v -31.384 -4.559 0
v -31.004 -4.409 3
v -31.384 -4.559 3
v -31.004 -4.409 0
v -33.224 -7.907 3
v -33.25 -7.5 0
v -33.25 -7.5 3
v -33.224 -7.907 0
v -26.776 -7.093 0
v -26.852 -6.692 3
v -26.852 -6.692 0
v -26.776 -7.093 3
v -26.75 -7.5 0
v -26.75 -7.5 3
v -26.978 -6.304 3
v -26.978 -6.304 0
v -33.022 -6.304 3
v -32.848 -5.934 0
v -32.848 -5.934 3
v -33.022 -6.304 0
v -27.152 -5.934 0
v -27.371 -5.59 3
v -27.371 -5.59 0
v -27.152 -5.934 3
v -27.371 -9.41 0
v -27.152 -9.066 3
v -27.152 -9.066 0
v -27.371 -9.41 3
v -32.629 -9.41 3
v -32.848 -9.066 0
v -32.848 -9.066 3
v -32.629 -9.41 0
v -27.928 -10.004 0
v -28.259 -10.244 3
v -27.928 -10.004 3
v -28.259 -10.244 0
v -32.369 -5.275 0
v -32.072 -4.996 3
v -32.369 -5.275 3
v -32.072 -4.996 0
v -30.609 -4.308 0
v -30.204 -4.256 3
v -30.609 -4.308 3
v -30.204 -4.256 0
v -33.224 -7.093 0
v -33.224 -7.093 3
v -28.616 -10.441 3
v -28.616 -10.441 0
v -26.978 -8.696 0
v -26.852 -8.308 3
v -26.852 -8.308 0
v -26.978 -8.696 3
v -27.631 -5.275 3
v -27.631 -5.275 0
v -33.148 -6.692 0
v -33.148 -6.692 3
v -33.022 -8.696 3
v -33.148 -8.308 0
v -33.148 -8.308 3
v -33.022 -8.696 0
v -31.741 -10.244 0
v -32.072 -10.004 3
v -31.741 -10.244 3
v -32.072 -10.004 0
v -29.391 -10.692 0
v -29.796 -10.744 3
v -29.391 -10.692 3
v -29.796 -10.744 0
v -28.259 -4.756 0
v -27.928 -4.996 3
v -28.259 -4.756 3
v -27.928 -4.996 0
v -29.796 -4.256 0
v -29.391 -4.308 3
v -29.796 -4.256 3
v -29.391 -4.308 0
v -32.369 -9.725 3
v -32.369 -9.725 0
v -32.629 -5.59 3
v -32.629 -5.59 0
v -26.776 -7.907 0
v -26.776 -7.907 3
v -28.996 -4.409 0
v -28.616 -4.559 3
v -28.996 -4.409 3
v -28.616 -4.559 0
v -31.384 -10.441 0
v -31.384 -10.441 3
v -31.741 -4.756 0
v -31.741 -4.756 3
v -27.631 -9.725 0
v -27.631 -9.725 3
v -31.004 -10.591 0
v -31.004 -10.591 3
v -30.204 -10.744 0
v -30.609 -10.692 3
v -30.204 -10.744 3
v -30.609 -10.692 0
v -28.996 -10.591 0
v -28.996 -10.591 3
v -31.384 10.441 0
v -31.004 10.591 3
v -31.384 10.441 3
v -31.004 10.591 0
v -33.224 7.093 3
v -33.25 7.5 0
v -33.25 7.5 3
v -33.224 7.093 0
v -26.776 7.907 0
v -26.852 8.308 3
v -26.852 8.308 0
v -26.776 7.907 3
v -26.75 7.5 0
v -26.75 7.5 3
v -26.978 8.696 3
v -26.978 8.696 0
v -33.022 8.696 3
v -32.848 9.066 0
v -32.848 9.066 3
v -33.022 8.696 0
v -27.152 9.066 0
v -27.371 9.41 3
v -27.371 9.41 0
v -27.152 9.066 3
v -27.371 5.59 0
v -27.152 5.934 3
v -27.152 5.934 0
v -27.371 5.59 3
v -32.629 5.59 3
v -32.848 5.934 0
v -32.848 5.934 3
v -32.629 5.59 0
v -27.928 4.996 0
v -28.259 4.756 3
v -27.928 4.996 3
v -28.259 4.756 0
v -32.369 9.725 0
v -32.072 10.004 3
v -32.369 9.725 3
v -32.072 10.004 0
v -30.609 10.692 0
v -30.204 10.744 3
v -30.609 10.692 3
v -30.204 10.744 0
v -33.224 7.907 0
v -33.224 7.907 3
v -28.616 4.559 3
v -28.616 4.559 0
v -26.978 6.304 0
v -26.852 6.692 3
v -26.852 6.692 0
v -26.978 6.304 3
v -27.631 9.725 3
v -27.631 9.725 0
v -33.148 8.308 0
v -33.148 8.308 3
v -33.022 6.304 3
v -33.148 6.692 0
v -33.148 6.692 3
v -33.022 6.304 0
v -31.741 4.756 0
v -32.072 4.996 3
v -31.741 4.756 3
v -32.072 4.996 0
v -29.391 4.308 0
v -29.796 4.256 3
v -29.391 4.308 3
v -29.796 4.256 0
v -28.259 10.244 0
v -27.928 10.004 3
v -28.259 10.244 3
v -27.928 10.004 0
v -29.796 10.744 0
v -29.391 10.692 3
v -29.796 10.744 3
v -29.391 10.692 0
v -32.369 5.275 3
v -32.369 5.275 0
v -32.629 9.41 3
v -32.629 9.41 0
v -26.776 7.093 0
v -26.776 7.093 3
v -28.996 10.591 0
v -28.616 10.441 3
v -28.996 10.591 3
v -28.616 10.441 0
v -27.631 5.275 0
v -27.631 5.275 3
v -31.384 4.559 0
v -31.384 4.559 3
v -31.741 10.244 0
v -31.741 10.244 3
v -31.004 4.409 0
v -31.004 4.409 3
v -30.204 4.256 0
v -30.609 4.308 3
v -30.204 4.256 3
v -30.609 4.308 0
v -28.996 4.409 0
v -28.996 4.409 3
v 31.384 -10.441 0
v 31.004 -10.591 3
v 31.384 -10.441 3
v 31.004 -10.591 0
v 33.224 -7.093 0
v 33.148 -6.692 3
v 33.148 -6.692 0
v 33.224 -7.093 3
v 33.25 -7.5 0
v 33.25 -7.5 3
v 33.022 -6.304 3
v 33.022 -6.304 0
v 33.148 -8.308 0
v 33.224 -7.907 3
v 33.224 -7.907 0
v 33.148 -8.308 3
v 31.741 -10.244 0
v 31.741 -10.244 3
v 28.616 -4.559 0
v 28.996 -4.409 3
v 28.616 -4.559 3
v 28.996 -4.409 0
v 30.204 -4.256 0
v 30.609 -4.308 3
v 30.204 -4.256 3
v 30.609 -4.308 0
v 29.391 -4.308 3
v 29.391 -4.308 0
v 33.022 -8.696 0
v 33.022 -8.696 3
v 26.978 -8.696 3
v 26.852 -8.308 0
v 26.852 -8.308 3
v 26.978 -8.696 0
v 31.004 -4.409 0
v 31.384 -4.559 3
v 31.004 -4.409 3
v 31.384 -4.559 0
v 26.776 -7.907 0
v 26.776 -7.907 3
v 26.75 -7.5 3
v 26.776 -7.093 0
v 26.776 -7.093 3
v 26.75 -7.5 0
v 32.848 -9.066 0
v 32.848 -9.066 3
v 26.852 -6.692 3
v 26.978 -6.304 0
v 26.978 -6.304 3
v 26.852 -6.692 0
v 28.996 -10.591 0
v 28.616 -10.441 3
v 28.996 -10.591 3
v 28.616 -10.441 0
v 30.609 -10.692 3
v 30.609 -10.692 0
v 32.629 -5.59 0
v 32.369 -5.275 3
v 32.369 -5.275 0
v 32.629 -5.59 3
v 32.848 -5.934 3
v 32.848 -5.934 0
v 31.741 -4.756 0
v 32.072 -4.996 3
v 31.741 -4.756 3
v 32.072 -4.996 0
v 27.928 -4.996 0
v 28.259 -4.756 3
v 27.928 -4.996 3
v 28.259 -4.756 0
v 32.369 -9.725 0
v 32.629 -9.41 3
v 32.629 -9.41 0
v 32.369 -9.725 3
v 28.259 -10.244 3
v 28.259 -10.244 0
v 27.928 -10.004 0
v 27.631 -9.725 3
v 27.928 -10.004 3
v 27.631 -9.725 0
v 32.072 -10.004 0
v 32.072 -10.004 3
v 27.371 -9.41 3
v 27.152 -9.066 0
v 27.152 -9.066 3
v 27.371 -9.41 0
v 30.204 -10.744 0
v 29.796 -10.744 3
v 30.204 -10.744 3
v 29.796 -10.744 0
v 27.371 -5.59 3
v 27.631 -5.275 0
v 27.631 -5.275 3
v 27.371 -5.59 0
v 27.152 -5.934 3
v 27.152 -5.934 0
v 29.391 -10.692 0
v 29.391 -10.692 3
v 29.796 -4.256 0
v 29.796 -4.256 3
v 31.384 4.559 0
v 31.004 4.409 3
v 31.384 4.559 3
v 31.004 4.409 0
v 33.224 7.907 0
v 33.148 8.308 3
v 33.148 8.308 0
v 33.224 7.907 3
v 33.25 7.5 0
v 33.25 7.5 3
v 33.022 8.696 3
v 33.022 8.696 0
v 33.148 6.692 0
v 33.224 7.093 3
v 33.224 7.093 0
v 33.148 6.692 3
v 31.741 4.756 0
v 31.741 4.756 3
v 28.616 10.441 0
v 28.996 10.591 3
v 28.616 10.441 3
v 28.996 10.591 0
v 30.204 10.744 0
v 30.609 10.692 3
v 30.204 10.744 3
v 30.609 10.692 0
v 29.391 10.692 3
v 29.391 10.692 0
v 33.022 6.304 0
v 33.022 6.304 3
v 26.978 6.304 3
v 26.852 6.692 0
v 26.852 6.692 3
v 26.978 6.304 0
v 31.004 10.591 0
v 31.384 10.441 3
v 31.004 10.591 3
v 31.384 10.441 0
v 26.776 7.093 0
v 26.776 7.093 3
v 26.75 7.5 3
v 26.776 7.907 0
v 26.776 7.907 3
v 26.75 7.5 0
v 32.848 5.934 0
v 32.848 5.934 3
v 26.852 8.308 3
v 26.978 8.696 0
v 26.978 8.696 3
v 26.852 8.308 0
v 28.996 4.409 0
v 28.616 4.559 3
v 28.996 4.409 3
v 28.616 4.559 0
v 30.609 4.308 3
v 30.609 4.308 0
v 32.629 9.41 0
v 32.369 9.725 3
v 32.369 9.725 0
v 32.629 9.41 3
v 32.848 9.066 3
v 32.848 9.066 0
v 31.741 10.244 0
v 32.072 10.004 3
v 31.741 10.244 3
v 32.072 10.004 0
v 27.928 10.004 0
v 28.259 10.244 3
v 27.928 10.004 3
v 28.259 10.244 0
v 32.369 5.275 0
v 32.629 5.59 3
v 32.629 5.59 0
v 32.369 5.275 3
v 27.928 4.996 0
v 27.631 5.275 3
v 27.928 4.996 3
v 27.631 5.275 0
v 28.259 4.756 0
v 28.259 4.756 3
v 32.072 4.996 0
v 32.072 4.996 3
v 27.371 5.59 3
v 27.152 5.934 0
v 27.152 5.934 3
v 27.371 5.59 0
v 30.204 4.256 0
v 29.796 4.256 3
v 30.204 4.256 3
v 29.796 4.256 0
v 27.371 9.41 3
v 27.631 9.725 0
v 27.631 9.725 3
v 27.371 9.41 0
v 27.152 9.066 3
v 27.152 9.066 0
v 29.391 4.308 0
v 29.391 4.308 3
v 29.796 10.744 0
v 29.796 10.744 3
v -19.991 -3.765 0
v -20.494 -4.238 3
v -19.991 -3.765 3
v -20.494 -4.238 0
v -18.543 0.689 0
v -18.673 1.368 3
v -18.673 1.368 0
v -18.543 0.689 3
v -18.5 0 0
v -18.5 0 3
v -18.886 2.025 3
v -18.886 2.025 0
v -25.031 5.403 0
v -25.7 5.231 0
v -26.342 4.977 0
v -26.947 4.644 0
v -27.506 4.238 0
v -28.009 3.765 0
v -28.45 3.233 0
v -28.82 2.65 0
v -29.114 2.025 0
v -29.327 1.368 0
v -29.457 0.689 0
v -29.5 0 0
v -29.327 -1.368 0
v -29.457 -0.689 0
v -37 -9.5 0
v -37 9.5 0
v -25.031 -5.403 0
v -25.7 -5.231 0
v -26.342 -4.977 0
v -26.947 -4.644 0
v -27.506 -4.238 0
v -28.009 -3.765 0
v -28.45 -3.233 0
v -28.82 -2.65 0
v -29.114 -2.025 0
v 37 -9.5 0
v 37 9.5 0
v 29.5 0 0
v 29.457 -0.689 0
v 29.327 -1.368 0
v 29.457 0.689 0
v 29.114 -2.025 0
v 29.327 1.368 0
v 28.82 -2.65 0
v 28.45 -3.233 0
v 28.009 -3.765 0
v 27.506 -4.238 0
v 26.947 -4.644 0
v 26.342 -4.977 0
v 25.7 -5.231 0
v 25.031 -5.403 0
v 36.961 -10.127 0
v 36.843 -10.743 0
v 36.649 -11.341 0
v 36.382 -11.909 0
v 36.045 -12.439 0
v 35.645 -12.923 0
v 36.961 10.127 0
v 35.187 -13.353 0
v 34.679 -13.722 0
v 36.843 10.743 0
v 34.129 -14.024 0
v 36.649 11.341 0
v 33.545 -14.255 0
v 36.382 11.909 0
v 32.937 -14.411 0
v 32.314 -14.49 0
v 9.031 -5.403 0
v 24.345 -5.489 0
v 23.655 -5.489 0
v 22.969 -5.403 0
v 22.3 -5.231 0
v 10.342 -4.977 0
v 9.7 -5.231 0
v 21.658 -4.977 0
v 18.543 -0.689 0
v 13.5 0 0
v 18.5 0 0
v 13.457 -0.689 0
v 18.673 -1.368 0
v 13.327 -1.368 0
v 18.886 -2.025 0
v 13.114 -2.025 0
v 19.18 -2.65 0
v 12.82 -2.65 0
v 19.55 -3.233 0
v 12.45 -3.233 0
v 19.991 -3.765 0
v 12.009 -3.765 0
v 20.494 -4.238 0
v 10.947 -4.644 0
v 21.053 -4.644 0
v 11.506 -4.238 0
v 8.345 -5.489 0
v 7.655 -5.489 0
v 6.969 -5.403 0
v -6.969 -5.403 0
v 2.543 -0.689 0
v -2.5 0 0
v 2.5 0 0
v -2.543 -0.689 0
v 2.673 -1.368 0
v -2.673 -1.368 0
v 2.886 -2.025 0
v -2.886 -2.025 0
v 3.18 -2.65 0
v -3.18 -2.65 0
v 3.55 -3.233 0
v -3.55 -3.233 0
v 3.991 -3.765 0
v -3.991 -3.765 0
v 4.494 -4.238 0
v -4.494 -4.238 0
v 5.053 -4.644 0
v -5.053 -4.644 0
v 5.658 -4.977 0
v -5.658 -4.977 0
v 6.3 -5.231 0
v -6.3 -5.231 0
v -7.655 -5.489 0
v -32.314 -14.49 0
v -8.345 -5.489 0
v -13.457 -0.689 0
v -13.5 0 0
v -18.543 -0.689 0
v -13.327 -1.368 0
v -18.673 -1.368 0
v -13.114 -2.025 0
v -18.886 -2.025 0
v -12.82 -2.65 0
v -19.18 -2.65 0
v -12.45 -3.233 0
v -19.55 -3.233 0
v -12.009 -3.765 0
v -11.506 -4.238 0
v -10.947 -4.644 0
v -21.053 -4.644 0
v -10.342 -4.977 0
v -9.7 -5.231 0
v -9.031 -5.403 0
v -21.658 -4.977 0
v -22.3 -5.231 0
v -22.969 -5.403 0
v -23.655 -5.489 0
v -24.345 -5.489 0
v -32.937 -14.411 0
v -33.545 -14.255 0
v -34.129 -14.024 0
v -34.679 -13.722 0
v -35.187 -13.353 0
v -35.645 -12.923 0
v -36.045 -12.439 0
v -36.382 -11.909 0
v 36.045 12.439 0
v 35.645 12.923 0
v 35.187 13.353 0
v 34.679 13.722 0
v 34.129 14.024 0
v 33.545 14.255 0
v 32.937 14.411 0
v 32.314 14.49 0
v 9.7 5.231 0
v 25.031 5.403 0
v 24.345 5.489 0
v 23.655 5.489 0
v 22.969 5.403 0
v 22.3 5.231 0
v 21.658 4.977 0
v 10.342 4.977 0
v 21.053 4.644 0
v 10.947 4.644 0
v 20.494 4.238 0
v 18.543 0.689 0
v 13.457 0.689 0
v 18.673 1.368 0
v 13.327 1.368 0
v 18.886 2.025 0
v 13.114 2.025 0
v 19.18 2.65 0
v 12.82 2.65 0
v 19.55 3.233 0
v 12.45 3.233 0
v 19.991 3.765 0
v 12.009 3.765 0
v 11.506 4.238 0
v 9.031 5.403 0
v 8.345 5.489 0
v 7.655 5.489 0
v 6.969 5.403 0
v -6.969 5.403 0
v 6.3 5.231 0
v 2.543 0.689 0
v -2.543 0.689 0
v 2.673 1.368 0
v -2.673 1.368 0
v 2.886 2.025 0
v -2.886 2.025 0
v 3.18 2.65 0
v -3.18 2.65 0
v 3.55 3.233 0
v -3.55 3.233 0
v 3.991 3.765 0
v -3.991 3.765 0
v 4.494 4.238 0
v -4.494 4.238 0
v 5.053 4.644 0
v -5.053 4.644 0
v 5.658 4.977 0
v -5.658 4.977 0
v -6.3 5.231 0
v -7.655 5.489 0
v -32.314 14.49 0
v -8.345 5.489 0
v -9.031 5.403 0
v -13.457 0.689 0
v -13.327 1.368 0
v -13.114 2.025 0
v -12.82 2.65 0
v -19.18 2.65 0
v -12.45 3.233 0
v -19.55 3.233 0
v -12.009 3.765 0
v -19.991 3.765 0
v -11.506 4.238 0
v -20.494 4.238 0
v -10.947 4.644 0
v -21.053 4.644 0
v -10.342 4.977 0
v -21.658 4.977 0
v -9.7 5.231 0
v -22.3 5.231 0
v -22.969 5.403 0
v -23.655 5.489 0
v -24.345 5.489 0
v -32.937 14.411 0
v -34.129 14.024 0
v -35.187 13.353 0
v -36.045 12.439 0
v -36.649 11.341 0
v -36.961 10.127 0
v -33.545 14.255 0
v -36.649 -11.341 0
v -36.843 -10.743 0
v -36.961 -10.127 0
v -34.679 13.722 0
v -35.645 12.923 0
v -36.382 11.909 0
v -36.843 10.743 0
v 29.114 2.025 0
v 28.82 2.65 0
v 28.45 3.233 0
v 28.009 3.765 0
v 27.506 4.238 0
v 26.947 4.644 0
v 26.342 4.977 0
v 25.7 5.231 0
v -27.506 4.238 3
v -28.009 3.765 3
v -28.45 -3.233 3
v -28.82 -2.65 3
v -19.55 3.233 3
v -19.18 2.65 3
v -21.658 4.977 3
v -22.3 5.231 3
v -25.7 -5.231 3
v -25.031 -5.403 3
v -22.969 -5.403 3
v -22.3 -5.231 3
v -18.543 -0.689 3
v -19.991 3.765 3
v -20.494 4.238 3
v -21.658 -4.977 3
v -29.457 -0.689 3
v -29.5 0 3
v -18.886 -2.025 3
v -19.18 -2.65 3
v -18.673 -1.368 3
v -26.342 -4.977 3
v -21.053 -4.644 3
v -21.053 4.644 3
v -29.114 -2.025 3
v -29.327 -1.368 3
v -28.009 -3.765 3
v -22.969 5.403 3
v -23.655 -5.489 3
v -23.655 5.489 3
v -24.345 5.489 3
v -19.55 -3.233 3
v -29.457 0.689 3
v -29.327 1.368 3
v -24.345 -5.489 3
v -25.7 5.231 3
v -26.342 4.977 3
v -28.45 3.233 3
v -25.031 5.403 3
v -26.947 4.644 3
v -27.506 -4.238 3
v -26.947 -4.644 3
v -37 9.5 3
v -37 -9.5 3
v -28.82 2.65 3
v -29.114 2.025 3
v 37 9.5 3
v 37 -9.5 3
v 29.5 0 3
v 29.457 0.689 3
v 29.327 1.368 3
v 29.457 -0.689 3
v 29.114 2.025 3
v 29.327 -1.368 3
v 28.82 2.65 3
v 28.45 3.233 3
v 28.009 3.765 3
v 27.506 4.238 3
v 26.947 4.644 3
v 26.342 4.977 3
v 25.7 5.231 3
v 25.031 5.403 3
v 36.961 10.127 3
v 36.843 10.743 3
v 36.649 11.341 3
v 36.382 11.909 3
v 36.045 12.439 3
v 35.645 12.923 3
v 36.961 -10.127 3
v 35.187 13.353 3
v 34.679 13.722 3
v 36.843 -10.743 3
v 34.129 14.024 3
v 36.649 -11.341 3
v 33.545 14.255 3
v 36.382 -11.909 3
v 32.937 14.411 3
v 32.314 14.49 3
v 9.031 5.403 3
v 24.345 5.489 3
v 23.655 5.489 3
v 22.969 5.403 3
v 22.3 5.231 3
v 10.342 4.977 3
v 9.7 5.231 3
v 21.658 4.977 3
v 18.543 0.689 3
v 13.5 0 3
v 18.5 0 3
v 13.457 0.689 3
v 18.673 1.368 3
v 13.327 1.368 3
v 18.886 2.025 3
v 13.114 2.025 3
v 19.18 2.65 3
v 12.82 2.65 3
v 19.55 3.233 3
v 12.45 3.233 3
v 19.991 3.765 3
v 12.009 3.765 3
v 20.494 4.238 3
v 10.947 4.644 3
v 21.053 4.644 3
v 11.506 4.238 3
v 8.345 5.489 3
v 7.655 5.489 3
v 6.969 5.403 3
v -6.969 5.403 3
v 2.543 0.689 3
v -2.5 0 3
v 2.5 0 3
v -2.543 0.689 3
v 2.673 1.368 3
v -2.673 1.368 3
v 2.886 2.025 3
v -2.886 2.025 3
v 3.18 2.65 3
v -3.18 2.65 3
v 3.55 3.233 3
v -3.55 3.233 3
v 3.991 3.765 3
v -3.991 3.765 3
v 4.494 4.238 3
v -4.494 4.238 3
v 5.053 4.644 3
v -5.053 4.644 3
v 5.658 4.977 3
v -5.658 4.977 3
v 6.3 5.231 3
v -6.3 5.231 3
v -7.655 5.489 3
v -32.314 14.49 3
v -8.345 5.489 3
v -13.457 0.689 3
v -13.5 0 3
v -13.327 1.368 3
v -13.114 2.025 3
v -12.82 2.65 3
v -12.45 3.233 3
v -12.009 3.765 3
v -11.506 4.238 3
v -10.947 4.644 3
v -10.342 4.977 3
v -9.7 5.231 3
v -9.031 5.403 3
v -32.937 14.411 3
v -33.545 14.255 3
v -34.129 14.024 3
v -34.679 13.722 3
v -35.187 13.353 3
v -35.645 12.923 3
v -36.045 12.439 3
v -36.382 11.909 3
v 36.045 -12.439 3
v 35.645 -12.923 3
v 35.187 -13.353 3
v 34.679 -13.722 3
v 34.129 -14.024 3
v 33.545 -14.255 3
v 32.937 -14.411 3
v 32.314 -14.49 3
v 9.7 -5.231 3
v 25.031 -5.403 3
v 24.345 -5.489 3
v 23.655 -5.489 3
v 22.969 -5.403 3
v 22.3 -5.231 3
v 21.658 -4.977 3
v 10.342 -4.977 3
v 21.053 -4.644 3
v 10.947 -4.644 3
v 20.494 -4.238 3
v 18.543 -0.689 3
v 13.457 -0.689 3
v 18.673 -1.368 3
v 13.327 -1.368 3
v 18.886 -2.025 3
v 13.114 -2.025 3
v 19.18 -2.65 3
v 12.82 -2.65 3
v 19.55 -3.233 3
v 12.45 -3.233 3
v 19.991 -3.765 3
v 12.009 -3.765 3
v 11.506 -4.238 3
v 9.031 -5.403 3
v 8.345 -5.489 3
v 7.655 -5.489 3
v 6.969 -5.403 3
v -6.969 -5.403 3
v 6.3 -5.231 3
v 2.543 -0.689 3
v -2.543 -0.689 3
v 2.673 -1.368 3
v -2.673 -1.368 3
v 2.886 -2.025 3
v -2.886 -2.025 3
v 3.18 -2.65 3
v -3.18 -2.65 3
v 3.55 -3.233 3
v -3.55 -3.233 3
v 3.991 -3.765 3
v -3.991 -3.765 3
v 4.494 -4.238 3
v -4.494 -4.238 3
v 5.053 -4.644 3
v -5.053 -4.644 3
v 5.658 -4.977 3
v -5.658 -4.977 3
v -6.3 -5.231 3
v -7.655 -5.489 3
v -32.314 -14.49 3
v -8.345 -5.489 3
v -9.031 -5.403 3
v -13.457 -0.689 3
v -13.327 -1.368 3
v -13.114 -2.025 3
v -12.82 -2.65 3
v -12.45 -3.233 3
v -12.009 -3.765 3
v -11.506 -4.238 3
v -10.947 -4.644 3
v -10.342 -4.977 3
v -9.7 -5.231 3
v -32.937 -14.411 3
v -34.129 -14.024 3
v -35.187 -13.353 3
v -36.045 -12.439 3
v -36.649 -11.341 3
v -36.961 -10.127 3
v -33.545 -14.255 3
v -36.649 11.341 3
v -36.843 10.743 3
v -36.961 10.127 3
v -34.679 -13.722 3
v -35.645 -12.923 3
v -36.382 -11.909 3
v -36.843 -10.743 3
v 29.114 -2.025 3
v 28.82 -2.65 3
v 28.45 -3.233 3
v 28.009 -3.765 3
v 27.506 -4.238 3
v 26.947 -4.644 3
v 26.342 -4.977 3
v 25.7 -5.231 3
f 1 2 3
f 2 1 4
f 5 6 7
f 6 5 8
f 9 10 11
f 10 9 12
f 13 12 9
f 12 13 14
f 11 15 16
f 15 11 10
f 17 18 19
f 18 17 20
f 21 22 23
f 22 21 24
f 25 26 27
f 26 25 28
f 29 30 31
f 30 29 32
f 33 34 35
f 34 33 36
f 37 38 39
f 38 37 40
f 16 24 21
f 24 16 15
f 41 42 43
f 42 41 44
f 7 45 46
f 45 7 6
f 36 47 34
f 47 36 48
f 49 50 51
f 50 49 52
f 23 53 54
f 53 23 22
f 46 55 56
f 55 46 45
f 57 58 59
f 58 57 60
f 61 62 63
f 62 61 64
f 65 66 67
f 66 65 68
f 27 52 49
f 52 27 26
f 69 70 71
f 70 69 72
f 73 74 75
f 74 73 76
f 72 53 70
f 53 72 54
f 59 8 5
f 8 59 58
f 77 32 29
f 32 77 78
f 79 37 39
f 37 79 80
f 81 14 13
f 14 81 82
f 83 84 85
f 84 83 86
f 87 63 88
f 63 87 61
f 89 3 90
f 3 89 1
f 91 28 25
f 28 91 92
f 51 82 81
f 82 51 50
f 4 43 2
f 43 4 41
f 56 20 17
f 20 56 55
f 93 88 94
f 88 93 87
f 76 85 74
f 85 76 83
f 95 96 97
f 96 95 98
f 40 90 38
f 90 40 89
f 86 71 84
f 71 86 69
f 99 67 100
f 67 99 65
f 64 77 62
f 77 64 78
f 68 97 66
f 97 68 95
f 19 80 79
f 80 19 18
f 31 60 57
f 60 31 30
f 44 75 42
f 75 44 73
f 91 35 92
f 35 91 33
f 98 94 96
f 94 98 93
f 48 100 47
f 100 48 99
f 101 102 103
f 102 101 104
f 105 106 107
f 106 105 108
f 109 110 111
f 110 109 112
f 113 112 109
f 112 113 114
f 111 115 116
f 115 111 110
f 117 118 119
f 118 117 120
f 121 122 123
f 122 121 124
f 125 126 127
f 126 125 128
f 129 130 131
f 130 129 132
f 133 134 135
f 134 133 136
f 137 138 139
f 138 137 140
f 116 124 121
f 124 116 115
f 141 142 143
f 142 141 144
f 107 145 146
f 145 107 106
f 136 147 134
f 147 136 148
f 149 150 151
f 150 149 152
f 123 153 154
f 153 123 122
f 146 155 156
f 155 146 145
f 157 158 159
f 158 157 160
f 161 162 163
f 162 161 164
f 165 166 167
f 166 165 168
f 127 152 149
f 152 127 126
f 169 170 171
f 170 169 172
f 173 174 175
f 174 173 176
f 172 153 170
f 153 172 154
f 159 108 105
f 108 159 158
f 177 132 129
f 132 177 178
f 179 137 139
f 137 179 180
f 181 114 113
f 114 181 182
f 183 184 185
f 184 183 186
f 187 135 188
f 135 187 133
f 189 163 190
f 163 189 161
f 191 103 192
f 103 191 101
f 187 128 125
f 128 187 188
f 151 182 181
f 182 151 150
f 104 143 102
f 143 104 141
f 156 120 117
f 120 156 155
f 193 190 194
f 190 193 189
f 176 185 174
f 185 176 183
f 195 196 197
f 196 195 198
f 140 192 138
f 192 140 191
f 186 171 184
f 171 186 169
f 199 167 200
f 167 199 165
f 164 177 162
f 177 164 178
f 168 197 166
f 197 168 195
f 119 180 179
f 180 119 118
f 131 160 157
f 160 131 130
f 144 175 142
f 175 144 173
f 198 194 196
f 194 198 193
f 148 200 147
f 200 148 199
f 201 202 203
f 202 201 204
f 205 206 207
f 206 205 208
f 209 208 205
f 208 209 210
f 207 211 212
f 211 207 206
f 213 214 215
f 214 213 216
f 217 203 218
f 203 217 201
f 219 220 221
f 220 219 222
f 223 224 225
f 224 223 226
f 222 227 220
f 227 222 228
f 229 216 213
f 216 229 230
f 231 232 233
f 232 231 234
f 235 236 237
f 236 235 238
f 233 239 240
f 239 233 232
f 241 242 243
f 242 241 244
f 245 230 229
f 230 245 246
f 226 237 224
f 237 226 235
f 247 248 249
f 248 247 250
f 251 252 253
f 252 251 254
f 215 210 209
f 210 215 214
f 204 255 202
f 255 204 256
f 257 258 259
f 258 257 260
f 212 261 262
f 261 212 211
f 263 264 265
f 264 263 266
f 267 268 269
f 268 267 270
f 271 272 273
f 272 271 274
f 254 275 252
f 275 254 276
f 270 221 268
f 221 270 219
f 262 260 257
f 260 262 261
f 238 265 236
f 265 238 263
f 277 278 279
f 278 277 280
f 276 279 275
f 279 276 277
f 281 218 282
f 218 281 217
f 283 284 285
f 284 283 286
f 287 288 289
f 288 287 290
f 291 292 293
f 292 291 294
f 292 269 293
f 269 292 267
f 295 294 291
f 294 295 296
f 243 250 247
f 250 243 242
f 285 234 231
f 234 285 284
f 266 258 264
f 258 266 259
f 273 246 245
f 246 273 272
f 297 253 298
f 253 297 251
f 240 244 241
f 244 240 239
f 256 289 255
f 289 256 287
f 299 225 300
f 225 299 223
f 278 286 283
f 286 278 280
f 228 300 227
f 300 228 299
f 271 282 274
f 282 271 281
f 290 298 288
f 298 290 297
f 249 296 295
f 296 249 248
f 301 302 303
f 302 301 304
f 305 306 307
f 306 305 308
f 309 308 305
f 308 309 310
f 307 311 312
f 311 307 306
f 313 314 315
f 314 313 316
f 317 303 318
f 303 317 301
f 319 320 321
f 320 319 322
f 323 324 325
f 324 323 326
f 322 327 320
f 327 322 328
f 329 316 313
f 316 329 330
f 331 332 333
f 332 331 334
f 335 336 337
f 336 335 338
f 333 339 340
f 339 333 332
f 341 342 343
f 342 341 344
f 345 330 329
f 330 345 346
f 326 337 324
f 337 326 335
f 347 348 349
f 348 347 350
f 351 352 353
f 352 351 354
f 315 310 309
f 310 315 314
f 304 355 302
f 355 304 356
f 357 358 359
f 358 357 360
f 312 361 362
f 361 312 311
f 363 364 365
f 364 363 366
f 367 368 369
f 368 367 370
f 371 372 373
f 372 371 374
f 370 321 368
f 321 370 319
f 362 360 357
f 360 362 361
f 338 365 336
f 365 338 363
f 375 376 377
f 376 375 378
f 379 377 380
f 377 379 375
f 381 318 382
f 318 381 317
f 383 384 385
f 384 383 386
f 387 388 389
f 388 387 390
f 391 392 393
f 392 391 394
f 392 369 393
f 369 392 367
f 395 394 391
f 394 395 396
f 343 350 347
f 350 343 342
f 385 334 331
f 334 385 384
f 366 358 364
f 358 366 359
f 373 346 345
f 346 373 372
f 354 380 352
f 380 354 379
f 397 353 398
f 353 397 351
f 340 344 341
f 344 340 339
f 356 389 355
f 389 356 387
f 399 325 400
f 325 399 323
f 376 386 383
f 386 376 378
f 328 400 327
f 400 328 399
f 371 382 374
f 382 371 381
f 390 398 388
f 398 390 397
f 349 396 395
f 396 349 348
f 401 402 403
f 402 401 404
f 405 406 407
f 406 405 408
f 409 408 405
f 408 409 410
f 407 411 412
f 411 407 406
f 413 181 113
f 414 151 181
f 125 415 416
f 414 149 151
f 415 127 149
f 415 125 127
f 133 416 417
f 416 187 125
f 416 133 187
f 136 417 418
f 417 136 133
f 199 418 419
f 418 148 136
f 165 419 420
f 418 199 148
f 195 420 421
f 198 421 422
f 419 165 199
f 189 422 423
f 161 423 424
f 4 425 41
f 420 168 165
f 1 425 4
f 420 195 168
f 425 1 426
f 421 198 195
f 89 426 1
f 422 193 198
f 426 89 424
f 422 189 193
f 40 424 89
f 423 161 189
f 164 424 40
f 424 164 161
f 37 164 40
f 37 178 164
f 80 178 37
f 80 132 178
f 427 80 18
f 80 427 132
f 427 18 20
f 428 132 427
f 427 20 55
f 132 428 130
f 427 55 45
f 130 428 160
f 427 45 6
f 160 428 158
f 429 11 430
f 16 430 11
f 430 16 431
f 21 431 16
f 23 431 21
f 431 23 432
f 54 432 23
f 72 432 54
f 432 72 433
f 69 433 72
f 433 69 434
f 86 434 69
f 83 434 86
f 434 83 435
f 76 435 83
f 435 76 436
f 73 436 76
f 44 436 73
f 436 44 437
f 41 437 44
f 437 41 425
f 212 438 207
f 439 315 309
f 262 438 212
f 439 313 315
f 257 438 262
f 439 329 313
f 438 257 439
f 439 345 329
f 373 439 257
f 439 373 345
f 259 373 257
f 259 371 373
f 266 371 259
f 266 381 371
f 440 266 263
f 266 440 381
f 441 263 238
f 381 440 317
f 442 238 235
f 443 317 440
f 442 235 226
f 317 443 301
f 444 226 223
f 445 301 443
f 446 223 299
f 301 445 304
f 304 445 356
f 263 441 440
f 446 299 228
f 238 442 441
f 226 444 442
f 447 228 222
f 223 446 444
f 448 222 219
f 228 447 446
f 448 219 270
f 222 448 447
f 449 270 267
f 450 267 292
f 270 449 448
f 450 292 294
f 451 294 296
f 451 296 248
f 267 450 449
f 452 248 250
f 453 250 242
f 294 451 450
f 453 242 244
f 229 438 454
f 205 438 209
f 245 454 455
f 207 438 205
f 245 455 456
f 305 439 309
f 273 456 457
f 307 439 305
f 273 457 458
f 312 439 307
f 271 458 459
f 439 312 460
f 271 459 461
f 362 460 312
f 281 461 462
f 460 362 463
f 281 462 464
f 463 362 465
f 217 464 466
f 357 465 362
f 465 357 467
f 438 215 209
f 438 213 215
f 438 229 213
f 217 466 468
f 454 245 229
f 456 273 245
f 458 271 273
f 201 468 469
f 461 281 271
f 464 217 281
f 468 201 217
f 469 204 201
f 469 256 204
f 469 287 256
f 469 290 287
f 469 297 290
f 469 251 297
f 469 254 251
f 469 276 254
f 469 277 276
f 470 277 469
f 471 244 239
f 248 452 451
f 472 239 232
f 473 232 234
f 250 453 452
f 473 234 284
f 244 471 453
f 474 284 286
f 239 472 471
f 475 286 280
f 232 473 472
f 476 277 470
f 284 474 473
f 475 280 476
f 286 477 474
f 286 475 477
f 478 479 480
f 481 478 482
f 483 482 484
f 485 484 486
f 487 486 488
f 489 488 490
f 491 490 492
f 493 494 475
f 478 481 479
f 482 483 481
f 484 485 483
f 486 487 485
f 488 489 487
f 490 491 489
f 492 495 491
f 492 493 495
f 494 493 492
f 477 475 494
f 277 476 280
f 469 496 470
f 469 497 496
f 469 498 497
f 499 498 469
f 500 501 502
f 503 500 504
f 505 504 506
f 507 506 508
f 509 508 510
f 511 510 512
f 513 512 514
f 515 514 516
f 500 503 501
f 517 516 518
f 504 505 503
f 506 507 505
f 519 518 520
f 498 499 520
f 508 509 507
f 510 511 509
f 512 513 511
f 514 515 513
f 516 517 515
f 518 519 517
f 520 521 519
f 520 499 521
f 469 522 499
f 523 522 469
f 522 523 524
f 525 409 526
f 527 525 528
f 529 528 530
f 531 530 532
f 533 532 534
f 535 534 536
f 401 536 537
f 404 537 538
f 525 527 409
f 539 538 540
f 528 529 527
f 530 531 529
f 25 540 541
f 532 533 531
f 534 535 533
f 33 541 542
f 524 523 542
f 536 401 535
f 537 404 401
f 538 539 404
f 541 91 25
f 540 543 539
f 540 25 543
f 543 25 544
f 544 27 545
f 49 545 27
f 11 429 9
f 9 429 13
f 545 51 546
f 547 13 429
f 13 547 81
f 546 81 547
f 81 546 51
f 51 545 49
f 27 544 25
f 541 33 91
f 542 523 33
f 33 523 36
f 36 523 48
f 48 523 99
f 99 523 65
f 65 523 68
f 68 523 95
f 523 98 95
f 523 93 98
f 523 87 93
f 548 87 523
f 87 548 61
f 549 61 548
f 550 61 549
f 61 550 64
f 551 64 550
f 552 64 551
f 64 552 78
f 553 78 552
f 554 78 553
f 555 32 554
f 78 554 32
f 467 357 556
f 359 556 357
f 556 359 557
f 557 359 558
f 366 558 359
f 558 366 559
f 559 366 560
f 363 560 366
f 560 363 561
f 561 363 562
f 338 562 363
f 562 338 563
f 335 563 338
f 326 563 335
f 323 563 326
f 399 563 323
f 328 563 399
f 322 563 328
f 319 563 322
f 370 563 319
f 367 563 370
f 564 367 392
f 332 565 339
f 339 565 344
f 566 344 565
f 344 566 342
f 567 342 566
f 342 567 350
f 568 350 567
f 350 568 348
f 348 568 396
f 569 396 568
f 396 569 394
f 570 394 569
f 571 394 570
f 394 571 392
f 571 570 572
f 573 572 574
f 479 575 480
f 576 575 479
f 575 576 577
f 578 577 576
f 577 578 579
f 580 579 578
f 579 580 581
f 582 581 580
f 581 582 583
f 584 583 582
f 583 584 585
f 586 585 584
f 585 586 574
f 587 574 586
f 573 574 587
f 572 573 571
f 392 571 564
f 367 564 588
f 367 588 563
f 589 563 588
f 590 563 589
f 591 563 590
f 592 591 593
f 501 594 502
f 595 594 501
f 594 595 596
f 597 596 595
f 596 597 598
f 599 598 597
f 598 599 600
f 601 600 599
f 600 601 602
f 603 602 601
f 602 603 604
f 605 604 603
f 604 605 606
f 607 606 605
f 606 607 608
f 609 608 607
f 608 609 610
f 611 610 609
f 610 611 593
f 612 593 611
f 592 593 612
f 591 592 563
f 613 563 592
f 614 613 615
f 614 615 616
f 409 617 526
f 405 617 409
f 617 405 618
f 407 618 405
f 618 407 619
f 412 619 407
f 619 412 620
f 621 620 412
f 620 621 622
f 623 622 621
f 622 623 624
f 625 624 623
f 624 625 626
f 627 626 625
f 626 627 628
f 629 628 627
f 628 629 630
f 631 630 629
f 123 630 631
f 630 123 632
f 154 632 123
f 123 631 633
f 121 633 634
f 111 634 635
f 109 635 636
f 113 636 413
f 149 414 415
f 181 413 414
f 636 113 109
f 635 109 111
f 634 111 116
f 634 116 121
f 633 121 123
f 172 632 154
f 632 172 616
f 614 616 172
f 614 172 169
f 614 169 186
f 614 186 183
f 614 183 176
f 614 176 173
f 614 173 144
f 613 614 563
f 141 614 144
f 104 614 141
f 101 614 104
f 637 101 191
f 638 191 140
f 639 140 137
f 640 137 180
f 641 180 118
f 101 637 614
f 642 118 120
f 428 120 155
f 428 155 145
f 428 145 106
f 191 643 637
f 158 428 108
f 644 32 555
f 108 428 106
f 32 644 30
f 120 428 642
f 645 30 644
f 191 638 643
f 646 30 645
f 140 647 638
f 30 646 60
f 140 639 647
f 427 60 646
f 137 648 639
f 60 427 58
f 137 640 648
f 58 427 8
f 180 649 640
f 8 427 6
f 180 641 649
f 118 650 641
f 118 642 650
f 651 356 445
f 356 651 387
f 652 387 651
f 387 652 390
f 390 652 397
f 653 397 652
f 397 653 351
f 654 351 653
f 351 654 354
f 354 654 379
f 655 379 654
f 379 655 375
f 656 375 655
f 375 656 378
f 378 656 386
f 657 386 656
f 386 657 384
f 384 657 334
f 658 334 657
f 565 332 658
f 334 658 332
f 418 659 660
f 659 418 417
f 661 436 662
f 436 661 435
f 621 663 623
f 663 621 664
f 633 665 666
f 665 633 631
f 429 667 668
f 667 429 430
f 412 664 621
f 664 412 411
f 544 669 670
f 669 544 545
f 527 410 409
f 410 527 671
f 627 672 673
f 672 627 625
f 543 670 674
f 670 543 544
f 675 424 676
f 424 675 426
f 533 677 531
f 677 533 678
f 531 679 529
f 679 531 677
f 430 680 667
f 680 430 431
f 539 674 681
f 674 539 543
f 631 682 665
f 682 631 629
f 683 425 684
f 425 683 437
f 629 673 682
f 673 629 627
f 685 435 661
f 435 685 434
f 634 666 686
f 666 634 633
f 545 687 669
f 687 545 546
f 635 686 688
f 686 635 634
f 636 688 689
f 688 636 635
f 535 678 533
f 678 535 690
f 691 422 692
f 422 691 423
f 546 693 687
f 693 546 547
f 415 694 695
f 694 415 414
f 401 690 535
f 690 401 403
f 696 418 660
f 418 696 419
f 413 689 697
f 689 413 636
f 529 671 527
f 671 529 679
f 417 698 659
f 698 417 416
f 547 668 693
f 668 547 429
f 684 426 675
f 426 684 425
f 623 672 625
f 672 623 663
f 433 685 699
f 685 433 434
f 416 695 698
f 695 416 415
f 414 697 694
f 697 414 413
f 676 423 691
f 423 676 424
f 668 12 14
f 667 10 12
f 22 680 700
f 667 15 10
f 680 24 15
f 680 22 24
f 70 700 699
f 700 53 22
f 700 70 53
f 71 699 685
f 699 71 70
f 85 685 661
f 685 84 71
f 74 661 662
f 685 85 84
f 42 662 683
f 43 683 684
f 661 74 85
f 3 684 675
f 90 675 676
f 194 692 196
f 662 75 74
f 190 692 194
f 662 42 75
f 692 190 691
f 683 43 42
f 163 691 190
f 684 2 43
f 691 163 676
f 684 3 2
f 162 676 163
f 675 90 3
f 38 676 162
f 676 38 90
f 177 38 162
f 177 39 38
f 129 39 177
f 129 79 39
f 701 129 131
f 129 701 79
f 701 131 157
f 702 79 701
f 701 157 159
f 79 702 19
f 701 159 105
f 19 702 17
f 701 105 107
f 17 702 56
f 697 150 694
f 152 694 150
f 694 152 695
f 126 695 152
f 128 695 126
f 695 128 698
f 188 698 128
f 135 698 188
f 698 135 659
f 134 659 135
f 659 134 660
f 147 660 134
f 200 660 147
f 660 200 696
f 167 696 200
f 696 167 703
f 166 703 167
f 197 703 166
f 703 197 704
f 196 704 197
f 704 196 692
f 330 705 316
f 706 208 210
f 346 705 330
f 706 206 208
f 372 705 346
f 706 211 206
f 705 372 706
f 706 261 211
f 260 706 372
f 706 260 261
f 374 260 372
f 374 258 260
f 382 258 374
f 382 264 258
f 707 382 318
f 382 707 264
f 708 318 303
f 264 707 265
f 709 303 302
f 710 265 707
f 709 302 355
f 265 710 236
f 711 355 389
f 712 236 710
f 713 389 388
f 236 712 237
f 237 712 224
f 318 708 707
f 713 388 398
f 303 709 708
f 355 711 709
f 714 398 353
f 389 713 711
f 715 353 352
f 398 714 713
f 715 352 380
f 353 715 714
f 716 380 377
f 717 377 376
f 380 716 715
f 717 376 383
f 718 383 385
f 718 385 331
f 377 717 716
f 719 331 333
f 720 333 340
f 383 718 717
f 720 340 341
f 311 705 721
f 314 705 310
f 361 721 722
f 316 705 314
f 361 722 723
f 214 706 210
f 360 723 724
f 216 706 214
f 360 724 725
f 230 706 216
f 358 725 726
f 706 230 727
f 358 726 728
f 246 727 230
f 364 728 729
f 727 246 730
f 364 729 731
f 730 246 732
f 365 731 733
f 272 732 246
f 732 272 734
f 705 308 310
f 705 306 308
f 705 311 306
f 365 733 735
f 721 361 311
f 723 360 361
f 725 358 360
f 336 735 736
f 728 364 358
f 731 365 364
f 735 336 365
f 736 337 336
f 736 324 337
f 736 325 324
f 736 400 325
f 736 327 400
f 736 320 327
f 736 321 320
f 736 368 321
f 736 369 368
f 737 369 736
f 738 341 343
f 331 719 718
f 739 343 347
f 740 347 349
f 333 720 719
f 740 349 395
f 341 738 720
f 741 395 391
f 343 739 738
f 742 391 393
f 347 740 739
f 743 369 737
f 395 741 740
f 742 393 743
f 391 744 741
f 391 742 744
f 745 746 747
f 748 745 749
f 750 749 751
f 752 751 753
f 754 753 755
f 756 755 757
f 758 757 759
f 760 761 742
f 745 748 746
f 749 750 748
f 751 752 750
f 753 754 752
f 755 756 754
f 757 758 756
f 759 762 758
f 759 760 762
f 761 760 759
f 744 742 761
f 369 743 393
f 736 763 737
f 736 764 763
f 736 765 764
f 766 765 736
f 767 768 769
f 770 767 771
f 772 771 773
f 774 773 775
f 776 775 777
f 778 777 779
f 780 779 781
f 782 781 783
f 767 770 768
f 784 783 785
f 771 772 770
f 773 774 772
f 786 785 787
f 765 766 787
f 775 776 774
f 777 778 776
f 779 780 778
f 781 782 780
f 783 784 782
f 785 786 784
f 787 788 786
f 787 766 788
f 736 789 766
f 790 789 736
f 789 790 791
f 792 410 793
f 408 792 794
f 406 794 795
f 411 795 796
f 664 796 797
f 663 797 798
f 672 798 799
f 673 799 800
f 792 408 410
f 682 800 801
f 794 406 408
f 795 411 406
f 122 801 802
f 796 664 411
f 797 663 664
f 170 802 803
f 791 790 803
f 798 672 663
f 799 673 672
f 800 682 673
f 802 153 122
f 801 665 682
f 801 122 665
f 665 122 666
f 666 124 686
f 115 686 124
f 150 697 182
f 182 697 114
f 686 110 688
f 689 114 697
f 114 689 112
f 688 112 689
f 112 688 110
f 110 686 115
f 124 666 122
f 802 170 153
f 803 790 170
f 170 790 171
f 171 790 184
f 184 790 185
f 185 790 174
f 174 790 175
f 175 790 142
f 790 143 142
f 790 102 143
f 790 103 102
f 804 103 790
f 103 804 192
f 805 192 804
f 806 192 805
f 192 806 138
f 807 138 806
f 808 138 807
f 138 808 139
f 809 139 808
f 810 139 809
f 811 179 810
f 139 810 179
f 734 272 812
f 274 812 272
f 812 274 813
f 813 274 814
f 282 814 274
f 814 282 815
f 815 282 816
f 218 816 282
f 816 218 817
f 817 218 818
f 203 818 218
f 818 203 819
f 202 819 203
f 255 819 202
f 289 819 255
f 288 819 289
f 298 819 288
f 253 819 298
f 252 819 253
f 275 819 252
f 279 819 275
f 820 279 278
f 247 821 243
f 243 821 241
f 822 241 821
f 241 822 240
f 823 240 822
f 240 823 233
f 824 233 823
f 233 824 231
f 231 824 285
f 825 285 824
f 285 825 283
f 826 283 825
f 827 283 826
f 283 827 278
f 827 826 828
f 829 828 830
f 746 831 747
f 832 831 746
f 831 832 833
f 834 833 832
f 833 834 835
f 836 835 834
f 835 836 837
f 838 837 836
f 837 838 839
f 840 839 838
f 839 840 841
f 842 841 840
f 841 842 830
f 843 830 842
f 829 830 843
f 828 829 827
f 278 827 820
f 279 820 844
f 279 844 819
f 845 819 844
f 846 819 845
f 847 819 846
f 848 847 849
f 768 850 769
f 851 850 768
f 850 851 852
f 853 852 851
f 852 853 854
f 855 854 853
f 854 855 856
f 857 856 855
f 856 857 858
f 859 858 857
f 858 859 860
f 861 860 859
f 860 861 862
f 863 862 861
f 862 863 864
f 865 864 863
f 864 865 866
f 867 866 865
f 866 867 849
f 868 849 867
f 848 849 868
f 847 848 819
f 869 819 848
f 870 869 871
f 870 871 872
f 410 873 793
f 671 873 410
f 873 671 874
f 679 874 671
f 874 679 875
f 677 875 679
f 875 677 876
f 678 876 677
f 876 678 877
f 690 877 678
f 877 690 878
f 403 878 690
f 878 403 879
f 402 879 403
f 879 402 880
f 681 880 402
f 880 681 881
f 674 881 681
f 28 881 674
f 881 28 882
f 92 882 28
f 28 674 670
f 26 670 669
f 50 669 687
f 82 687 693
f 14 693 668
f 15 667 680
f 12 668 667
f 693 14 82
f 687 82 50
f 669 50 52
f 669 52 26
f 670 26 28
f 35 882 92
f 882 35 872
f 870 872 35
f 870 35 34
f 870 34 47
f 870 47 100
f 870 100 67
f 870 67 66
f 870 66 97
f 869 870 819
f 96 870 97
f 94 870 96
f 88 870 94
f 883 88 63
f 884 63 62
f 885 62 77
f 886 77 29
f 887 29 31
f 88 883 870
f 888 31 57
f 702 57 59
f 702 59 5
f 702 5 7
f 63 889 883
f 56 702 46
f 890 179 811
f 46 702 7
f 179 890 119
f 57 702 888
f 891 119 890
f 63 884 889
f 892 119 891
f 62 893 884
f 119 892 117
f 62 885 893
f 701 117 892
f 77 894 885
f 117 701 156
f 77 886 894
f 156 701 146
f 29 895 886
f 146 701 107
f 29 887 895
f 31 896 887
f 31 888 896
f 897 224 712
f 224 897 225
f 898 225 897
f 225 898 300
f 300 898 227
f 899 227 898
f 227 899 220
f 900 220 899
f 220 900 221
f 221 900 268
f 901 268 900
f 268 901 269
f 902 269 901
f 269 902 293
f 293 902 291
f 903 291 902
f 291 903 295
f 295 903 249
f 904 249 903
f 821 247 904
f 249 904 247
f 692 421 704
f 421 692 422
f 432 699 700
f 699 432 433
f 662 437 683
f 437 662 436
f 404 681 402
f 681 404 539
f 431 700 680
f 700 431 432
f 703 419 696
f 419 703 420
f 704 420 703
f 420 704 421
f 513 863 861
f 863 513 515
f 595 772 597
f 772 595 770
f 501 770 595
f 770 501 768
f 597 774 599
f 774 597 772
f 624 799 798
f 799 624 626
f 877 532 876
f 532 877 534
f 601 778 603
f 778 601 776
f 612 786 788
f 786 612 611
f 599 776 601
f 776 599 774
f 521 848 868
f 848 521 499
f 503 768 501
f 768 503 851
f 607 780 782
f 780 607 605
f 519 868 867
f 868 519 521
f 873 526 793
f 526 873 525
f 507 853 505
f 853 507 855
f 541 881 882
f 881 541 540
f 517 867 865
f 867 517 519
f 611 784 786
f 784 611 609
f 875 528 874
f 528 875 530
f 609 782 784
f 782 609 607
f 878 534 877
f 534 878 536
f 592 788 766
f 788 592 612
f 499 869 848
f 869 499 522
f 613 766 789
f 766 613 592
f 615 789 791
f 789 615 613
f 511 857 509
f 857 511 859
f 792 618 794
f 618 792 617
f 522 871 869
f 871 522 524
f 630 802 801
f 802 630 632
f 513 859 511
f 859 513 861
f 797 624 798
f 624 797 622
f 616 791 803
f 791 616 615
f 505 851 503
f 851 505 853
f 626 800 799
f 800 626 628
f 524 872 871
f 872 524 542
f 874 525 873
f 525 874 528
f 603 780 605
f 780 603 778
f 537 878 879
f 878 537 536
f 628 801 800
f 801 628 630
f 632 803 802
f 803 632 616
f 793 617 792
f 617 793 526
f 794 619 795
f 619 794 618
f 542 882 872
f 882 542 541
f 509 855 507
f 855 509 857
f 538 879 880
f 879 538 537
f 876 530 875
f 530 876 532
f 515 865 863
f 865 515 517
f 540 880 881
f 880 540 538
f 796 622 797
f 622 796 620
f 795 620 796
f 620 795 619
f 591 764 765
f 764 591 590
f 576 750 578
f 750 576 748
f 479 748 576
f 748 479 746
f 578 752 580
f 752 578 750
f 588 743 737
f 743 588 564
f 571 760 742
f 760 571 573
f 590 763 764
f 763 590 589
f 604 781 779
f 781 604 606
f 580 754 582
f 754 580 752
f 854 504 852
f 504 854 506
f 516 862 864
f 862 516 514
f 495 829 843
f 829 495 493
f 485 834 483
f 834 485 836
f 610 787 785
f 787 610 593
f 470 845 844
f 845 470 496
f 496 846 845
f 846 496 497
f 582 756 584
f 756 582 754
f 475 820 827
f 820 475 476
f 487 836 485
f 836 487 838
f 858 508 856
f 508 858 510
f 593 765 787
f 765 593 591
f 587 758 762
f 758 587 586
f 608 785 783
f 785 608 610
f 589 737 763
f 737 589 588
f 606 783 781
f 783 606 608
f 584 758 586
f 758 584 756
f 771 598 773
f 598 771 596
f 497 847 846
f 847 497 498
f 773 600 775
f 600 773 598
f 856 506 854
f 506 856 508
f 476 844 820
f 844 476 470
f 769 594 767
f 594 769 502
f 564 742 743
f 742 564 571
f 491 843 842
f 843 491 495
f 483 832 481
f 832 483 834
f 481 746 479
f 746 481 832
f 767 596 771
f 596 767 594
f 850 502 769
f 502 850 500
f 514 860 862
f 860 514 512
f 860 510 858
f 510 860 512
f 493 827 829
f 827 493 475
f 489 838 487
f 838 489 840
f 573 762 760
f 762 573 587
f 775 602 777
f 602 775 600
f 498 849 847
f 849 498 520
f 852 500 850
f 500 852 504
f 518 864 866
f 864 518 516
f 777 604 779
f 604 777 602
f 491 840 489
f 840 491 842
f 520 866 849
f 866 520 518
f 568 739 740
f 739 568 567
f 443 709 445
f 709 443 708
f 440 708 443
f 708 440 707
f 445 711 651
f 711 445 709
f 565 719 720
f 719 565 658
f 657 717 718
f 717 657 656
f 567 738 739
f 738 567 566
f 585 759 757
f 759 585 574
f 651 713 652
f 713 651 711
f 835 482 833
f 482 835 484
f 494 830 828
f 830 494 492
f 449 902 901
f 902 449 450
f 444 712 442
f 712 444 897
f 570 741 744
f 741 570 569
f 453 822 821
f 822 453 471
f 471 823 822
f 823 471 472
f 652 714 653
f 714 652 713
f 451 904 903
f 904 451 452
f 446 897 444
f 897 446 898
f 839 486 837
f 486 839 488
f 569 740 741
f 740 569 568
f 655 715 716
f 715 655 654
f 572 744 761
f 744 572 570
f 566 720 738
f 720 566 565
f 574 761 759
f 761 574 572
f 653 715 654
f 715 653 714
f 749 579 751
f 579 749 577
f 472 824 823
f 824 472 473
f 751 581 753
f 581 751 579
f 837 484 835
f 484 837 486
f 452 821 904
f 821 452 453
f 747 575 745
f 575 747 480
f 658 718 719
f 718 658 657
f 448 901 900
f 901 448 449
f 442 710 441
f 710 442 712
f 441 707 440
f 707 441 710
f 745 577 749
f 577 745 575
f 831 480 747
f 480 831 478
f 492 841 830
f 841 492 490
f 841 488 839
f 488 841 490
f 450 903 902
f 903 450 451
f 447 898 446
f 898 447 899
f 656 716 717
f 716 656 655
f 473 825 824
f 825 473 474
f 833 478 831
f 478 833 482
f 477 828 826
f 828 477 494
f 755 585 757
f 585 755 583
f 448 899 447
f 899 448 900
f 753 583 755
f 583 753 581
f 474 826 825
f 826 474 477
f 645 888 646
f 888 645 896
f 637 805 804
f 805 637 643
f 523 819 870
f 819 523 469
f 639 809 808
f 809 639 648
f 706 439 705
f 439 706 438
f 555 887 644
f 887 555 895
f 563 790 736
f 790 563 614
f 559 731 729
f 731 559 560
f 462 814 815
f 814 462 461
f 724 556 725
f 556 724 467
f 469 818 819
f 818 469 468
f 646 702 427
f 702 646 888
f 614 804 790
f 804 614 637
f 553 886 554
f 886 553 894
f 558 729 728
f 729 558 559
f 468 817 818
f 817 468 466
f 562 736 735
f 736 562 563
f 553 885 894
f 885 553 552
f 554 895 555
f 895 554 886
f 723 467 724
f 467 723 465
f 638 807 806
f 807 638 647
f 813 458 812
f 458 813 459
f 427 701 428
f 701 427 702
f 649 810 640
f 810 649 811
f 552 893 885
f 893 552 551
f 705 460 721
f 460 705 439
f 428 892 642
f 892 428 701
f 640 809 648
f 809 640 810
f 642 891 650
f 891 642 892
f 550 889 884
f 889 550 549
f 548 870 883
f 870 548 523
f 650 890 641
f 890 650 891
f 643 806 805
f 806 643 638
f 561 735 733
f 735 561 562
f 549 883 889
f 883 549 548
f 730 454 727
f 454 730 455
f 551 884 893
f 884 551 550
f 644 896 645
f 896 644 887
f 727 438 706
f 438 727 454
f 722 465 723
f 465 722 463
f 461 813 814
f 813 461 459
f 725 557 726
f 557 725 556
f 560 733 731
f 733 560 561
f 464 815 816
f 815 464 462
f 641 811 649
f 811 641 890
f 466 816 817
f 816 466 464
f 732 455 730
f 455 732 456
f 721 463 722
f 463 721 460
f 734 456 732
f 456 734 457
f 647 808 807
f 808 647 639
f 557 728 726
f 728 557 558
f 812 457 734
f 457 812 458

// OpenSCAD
$fn = 50;


difference() {
	union() {
		hull() {
			translate(v = [-32.0000000000, 9.5000000000, 0]) {
				cylinder(h = 3, r = 5);
			}
			translate(v = [32.0000000000, 9.5000000000, 0]) {
				cylinder(h = 3, r = 5);
			}
			translate(v = [-32.0000000000, -9.5000000000, 0]) {
				cylinder(h = 3, r = 5);
			}
			translate(v = [32.0000000000, -9.5000000000, 0]) {
				cylinder(h = 3, r = 5);
			}
		}
	}
	union() {
		#translate(v = [-30.0000000000, -7.5000000000, -100.0000000000]) {
			cylinder(h = 200, r = 3.2500000000);
		}
		#translate(v = [-30.0000000000, 7.5000000000, -100.0000000000]) {
			cylinder(h = 200, r = 3.2500000000);
		}
		#translate(v = [30.0000000000, -7.5000000000, -100.0000000000]) {
			cylinder(h = 200, r = 3.2500000000);
		}
		#translate(v = [30.0000000000, 7.5000000000, -100.0000000000]) {
			cylinder(h = 200, r = 3.2500000000);
		}
		#translate(v = [-24.0000000000, 0, 0]) {
			cylinder(h = 3, r = 5.5000000000);
		}
		#translate(v = [-8.0000000000, 0, 0]) {
			cylinder(h = 3, r = 5.5000000000);
		}
		#translate(v = [8.0000000000, 0, 0]) {
			cylinder(h = 3, r = 5.5000000000);
		}
		#translate(v = [24.0000000000, 0, 0]) {
			cylinder(h = 3, r = 5.5000000000);
		}
	}
}
